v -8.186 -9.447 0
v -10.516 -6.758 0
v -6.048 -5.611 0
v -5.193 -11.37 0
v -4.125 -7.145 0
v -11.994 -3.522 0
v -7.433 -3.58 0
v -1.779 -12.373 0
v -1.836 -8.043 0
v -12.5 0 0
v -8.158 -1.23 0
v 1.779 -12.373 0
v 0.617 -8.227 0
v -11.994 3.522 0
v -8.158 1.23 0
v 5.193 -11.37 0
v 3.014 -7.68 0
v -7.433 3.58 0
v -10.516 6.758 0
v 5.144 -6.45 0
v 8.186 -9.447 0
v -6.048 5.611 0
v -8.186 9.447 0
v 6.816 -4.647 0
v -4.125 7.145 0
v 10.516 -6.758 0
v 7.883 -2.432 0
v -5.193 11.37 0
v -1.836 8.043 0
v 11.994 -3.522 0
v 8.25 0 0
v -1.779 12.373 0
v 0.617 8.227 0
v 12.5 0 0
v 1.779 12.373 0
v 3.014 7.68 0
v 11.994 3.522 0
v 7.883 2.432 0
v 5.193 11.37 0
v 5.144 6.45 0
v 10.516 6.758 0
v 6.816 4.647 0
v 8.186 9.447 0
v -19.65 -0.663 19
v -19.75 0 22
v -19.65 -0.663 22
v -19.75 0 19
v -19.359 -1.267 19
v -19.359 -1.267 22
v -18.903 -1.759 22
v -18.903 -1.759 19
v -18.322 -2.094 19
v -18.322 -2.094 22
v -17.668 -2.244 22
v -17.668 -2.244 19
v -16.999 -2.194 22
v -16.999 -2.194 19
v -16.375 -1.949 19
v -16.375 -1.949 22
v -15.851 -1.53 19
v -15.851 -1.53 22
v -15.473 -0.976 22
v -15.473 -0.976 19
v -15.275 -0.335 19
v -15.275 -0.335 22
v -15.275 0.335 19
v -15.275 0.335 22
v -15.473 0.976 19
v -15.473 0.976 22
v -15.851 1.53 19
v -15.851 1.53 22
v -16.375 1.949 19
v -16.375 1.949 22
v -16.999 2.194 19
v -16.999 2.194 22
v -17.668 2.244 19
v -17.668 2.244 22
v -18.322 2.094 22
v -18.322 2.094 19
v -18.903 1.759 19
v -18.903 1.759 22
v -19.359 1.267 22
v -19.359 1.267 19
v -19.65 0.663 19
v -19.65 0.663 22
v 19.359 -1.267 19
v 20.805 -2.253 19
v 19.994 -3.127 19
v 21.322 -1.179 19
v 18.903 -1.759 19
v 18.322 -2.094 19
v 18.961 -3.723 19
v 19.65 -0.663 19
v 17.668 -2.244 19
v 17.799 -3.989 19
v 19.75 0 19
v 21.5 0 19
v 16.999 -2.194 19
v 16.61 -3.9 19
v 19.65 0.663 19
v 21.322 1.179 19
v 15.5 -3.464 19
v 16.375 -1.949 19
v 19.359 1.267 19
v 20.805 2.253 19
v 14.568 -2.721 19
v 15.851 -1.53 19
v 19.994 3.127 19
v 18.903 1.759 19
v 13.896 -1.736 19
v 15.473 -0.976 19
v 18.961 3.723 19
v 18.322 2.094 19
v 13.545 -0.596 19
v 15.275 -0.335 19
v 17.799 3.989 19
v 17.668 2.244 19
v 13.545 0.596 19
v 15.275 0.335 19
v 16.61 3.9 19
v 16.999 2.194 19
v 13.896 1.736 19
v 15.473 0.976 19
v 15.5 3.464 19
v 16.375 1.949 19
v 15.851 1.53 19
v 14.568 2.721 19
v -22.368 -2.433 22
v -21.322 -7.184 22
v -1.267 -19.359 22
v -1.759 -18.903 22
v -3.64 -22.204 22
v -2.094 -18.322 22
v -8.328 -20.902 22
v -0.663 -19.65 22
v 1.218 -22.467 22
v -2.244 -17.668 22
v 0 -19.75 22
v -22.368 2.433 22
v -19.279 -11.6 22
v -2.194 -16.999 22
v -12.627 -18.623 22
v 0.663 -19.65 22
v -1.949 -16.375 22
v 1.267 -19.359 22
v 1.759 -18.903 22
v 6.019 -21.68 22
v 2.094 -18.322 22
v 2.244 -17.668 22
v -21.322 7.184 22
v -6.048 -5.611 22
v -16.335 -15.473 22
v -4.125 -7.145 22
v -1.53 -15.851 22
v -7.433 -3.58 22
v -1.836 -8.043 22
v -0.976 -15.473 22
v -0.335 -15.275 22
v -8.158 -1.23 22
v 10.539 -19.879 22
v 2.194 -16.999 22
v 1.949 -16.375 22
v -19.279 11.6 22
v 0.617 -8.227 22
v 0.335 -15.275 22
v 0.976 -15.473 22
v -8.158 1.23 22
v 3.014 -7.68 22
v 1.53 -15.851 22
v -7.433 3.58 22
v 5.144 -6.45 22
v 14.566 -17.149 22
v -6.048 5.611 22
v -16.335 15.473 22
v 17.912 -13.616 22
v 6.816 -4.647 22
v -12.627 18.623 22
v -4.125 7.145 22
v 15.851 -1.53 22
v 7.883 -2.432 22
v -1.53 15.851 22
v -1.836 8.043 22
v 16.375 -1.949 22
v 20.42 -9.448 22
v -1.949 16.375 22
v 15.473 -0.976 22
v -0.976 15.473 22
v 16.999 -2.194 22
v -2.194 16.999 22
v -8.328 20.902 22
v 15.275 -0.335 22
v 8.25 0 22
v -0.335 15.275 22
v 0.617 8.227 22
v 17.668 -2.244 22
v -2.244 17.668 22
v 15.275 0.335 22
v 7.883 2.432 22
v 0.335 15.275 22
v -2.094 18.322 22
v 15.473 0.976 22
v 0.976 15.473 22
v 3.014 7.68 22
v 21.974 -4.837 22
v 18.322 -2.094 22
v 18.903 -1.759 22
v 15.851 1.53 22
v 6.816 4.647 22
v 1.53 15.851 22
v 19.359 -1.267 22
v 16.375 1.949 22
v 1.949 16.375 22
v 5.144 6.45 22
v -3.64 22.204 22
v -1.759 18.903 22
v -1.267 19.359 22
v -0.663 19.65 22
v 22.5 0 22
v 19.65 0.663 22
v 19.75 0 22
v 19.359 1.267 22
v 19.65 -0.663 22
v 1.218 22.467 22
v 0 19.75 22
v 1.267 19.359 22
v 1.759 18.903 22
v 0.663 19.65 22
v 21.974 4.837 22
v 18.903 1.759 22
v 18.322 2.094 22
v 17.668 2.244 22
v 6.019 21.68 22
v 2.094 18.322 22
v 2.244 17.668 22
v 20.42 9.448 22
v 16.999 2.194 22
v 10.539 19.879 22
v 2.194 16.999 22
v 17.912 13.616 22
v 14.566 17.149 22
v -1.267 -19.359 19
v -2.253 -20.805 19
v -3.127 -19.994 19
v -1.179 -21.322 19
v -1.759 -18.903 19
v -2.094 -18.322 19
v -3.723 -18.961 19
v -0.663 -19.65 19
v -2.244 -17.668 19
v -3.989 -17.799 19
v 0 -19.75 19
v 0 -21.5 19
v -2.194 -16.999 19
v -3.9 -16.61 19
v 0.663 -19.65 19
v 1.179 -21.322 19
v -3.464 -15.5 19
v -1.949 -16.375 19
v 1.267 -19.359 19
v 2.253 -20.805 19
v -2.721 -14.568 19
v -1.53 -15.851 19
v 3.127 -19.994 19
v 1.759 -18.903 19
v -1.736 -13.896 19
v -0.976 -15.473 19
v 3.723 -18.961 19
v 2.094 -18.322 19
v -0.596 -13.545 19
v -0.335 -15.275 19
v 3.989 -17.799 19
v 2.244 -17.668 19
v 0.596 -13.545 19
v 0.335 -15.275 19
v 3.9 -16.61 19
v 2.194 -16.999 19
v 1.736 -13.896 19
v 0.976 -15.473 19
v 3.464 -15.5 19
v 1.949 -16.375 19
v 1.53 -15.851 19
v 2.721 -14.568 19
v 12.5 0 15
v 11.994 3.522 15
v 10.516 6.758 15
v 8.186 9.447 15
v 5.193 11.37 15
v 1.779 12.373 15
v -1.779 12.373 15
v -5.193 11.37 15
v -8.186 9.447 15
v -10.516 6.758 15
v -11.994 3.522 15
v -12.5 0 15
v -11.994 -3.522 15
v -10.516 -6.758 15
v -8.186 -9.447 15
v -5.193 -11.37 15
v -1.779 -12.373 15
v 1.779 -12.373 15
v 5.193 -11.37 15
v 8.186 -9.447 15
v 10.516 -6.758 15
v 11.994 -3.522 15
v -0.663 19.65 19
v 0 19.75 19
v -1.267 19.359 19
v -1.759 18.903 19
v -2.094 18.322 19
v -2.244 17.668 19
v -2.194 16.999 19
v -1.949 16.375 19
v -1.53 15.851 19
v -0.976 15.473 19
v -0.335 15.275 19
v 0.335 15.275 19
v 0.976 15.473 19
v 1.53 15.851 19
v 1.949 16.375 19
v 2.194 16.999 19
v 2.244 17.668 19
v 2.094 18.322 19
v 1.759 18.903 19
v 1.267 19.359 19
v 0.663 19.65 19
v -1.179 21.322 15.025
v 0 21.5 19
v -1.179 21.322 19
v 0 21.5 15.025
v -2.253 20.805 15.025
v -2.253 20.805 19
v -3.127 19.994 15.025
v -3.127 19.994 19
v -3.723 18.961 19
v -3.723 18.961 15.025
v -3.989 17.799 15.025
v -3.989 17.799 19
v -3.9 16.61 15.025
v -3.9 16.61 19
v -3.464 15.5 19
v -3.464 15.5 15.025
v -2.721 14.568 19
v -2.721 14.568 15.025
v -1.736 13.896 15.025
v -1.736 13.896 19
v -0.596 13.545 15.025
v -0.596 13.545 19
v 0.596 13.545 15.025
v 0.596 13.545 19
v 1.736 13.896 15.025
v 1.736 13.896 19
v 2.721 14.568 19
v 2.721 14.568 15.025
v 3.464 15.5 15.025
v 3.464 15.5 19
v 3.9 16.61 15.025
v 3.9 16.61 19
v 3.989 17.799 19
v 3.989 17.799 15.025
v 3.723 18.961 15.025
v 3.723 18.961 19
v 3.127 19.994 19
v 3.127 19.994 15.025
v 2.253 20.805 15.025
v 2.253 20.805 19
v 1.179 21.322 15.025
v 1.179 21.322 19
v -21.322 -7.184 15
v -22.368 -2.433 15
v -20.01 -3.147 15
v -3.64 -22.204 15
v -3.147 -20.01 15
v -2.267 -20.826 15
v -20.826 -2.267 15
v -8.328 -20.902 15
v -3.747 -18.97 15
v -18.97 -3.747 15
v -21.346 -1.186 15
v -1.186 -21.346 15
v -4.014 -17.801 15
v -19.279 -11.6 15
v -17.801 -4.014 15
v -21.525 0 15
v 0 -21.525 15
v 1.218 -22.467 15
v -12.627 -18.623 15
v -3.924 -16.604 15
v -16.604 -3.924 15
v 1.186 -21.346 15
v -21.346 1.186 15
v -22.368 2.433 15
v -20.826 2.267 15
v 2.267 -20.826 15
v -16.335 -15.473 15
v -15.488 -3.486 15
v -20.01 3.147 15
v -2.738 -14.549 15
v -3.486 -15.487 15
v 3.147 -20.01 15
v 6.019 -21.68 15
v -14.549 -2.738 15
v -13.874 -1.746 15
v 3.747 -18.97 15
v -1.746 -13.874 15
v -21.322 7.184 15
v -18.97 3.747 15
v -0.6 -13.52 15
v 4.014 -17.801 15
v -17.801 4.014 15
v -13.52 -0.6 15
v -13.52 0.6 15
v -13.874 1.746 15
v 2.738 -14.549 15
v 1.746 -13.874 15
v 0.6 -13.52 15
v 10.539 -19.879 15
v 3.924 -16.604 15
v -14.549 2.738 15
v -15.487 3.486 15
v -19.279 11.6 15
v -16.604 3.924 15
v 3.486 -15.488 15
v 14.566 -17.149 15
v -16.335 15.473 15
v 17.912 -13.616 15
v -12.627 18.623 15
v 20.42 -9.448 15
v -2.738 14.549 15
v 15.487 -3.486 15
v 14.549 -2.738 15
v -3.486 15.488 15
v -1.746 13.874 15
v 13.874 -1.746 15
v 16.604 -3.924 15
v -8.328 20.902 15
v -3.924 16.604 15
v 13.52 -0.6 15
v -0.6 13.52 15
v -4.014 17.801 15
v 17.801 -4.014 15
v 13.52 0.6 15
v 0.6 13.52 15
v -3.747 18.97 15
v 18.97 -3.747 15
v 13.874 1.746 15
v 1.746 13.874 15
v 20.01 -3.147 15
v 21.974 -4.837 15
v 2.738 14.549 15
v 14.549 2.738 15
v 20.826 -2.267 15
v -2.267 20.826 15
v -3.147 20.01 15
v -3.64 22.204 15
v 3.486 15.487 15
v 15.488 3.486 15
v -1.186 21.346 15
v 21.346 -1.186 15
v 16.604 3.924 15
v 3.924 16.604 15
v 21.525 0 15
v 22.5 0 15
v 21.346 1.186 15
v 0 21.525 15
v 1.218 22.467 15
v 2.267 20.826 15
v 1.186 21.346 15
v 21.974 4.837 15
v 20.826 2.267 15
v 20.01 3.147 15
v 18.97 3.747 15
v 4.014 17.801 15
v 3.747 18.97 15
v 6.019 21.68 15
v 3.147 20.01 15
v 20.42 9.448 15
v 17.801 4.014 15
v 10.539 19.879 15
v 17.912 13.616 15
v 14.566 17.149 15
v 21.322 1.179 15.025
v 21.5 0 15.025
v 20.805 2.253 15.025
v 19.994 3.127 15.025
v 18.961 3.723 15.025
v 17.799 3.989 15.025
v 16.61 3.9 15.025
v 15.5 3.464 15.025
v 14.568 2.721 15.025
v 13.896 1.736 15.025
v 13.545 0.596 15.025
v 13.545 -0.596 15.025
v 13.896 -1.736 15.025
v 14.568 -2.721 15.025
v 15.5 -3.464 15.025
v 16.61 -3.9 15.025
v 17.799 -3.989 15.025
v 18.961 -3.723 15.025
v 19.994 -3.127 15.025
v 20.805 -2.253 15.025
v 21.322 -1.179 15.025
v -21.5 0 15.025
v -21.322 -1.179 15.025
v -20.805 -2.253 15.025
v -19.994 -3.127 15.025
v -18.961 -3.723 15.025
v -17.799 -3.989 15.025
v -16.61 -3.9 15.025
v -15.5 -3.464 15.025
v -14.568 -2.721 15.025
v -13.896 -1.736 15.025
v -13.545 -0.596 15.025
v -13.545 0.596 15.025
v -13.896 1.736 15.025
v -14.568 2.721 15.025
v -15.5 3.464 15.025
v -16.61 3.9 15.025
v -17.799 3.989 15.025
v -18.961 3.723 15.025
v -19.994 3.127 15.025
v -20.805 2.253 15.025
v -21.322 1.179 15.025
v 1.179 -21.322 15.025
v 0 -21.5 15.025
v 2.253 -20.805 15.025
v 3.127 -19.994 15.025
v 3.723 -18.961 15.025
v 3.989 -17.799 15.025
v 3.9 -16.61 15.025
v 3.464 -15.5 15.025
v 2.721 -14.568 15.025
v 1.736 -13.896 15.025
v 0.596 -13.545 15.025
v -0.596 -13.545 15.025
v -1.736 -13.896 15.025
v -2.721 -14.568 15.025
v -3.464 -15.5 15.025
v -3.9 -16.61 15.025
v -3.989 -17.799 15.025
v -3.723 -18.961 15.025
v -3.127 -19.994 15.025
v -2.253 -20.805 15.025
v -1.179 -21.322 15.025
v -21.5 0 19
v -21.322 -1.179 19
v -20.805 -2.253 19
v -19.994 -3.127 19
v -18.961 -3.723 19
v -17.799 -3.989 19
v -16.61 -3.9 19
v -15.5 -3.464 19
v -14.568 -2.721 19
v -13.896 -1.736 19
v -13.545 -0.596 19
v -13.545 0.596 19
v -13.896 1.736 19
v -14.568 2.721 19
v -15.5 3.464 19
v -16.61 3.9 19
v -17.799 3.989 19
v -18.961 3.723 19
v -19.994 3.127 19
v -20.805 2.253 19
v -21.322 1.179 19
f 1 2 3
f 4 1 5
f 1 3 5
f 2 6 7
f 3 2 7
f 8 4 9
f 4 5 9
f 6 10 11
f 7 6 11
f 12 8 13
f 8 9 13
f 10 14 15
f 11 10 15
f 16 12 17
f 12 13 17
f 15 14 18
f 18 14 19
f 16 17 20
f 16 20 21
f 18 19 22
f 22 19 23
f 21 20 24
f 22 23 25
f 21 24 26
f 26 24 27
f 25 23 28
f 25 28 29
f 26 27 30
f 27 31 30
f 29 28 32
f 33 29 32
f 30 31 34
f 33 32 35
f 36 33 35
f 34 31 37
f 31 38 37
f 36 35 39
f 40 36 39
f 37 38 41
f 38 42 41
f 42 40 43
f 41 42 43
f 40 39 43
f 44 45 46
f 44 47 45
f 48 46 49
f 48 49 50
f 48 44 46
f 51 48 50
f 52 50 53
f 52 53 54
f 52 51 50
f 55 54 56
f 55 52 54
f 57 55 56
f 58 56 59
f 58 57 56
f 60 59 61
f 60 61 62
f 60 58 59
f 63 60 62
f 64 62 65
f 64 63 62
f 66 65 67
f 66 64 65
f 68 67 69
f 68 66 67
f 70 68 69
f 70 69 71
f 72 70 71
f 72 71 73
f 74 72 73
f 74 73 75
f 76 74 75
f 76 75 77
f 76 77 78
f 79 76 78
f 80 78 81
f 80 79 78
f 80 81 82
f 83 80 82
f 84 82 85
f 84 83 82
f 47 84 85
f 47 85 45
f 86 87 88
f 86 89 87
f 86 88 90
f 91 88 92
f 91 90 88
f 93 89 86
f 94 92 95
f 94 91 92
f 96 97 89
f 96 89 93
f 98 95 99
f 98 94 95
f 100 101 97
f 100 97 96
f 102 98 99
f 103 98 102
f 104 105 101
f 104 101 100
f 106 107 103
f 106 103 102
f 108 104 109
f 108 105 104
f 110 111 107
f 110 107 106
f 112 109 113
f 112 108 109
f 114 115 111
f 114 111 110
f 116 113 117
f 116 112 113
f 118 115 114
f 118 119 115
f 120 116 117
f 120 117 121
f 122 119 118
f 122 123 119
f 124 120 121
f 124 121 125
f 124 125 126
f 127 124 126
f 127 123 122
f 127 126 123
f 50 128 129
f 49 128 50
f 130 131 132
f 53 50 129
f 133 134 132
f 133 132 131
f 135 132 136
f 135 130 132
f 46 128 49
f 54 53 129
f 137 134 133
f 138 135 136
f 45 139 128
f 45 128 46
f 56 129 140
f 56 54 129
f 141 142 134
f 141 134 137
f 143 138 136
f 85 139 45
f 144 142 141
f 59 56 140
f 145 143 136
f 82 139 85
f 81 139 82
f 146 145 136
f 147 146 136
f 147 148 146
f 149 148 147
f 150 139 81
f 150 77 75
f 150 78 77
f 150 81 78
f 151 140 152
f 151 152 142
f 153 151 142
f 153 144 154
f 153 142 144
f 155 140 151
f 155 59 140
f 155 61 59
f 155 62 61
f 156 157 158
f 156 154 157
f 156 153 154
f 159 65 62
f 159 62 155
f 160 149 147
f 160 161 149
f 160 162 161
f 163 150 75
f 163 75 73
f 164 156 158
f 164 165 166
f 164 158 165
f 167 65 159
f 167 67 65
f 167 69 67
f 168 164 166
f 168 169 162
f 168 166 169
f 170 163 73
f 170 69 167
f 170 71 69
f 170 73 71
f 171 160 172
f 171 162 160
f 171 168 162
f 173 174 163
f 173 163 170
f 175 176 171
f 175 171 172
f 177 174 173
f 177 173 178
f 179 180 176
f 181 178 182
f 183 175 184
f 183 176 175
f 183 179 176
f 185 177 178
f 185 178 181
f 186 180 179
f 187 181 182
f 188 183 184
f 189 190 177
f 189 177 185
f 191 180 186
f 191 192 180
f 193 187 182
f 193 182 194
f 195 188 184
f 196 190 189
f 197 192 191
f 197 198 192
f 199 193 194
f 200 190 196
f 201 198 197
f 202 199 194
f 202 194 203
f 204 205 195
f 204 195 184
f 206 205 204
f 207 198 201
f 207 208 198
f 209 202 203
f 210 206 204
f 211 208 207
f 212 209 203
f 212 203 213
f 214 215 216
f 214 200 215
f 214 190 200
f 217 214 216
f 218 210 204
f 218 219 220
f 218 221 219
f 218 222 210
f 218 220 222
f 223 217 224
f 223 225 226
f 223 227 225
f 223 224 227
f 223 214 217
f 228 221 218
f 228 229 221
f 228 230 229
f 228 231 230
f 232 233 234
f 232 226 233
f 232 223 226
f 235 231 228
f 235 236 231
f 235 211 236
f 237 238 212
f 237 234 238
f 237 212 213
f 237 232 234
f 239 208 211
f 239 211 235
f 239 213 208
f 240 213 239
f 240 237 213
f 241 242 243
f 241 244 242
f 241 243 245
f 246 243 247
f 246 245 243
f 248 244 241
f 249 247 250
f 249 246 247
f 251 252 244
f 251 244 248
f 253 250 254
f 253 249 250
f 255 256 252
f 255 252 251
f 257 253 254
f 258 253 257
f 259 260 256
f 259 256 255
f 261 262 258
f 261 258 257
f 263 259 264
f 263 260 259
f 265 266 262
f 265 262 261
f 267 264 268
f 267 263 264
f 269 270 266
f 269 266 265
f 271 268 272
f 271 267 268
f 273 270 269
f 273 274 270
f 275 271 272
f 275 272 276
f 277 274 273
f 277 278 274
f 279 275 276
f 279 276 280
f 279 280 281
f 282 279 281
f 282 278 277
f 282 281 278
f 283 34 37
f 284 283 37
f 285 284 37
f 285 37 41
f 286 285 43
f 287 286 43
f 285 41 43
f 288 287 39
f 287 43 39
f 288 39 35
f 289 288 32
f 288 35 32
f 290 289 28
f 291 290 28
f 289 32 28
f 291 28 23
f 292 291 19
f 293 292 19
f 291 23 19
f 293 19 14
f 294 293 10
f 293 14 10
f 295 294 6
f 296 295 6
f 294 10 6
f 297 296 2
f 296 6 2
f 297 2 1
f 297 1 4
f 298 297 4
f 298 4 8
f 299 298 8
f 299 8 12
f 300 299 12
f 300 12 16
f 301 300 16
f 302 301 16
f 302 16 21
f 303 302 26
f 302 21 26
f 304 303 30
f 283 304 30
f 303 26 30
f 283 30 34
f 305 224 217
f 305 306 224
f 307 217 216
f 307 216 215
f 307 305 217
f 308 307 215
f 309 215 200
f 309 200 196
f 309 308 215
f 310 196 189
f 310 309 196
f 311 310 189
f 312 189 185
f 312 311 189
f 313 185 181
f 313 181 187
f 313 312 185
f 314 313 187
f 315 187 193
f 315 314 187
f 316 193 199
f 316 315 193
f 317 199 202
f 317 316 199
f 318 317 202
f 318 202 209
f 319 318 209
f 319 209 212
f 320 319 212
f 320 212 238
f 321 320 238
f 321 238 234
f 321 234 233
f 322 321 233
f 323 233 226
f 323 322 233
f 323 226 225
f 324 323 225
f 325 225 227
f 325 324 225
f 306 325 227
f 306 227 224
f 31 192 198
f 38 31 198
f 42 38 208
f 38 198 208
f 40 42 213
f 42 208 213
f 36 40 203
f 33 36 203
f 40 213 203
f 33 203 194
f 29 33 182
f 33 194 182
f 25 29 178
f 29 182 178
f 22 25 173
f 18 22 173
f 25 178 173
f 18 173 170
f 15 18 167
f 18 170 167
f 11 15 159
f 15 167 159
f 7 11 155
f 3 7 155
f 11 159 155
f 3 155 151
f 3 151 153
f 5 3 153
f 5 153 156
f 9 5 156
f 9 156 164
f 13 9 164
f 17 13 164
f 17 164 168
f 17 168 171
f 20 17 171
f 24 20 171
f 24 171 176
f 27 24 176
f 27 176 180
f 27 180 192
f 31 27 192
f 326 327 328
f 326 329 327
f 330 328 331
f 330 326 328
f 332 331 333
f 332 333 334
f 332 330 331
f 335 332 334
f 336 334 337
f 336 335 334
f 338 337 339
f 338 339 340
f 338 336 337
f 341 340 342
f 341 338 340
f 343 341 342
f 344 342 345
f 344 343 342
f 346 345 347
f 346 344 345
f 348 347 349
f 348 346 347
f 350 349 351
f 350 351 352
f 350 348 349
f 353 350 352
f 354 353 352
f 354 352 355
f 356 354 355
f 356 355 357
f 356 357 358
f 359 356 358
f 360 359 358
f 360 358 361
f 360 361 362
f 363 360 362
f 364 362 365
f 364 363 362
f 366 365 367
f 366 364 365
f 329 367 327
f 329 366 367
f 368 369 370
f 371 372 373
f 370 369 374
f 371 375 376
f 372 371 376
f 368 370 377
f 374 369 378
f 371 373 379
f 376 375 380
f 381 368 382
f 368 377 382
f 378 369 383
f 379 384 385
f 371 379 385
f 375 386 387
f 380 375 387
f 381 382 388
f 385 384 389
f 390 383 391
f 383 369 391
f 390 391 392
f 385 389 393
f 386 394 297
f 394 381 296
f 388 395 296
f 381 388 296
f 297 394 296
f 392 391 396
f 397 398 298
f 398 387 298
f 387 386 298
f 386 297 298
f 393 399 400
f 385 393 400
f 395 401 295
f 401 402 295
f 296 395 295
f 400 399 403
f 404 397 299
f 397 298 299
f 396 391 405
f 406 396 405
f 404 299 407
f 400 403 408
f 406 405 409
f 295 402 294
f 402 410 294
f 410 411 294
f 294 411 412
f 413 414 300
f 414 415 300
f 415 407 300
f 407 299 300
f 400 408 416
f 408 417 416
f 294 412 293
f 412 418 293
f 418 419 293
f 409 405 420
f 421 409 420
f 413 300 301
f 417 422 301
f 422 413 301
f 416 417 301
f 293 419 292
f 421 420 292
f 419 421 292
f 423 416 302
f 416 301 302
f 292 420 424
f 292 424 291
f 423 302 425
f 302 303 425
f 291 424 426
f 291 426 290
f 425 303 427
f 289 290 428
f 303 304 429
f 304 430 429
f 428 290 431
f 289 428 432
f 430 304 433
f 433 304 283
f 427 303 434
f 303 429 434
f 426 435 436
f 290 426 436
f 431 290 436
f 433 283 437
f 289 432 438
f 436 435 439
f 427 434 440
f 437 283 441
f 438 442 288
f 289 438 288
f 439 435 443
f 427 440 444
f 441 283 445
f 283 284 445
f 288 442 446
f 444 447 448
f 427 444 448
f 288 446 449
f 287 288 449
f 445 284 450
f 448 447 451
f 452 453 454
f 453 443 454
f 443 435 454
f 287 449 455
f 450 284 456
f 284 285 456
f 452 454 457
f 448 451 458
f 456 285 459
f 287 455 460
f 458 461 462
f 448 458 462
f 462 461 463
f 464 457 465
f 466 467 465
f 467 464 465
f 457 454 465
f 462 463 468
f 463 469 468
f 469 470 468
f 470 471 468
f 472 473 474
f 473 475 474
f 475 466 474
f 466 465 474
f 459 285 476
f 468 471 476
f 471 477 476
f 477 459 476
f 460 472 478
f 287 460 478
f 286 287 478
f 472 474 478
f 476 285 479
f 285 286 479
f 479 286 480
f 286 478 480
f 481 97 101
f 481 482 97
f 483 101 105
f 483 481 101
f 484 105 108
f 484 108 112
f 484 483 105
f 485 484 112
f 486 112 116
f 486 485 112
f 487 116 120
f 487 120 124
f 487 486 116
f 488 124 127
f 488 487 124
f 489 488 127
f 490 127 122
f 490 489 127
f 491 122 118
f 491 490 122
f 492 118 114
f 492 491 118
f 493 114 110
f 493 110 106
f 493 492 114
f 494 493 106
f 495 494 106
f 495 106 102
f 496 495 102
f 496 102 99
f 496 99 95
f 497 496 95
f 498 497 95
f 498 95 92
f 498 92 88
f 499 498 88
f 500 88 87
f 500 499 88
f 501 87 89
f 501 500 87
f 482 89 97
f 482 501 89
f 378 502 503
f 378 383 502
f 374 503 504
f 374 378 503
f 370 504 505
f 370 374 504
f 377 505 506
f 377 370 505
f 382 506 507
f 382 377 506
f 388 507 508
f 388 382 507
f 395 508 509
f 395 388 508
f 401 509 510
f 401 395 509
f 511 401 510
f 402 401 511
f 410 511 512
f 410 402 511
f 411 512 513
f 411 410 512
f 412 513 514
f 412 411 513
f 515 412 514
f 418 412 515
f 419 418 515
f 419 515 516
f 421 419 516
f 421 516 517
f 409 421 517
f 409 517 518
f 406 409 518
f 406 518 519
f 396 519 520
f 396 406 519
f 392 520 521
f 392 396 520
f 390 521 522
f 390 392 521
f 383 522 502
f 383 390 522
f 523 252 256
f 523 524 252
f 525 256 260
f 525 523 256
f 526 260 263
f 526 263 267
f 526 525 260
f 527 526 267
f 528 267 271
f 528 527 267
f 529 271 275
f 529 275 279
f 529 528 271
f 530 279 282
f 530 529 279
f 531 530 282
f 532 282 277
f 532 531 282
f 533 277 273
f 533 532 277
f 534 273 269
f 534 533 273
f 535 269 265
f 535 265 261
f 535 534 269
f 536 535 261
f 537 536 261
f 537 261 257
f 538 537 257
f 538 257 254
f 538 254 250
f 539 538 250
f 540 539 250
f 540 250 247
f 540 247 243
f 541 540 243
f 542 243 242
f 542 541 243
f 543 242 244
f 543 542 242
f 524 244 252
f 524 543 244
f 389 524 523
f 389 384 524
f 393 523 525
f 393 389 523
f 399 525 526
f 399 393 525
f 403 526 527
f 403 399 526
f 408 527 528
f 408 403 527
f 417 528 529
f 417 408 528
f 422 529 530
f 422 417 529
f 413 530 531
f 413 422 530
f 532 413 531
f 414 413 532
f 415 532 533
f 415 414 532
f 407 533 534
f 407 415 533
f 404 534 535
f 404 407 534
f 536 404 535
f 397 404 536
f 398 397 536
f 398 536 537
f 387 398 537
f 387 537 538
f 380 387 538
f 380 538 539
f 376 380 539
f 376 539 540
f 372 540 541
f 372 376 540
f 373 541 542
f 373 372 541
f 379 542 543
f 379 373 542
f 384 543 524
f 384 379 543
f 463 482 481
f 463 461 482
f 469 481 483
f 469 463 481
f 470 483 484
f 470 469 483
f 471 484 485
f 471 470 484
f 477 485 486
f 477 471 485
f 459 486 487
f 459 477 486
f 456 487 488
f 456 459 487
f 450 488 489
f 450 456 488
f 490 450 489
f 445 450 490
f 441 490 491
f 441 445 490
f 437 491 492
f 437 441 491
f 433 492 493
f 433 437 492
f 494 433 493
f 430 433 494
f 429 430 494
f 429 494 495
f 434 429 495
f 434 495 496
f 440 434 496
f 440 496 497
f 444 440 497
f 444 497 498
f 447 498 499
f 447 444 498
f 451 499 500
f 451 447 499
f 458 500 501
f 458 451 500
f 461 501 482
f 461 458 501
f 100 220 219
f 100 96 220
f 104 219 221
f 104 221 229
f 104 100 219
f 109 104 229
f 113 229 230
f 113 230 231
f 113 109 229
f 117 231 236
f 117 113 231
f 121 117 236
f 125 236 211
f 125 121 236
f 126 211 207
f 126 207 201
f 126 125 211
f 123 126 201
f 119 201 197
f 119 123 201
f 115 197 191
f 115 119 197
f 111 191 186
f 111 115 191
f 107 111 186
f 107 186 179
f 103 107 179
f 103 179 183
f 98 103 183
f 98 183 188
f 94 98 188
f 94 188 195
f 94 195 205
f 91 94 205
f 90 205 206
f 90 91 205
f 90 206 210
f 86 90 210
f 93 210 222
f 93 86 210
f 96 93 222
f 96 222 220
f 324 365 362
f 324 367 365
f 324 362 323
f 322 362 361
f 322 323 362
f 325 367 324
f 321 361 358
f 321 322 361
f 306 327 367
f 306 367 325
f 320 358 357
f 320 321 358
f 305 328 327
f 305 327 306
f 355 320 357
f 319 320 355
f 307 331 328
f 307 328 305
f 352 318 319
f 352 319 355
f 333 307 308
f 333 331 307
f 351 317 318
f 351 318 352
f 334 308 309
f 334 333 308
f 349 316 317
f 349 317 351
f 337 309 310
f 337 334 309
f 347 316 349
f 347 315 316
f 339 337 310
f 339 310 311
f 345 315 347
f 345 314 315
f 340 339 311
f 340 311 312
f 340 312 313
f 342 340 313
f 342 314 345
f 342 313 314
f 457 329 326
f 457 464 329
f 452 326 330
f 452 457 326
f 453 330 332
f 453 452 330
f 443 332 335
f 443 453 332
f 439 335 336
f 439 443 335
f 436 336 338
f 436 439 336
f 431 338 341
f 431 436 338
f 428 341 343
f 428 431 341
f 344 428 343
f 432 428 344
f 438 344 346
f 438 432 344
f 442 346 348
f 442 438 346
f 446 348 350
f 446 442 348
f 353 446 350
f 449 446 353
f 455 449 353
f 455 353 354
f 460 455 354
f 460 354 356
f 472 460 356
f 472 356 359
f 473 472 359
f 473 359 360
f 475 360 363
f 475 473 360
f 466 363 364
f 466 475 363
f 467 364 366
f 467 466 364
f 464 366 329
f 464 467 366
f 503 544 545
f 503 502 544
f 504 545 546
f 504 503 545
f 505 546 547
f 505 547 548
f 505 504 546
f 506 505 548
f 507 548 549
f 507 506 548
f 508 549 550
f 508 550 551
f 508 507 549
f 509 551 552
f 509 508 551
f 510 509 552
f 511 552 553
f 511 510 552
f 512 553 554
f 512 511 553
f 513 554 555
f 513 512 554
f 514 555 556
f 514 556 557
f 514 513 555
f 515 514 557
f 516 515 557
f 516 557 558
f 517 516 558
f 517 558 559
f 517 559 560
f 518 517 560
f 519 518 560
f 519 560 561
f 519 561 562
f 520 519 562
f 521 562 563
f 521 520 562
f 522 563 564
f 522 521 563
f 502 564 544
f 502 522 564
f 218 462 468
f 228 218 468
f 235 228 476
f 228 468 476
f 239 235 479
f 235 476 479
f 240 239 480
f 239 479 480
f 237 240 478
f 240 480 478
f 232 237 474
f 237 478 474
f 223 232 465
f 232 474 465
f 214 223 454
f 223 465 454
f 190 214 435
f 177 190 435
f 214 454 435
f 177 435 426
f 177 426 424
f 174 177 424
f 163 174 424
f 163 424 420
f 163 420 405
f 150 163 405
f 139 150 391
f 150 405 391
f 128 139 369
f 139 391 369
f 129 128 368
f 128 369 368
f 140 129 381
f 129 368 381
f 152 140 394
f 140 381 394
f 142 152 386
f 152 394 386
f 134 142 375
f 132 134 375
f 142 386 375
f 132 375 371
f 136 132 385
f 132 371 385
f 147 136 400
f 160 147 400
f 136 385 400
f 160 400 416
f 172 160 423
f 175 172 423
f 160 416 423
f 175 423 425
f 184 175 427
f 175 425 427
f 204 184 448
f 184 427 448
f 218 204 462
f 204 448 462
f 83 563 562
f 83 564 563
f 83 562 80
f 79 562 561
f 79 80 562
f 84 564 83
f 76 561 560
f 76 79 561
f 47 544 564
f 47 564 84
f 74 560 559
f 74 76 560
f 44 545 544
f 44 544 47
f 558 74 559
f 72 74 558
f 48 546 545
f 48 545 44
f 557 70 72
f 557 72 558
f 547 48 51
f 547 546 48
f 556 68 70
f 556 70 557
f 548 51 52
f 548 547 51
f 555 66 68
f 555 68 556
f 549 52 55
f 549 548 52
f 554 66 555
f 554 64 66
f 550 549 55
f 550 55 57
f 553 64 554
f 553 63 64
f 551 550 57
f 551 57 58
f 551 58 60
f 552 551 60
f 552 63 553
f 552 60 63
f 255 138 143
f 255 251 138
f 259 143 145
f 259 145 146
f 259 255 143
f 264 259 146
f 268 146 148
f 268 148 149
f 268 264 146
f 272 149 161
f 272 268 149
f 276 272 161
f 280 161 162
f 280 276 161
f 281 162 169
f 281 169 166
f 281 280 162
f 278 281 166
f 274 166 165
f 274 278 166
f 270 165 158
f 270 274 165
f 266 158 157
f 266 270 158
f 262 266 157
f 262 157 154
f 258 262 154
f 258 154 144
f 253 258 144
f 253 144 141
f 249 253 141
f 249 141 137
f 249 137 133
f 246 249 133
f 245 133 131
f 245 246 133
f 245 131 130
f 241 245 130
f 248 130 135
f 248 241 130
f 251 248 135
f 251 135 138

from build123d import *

# Parameters (mm, degrees)
SKETCH_1_R               = 12.5
EXTRUDE_1_DEPTH          = 15
SKETCH_2_R               = 22.5
EXTRUDE_2_DEPTH          = 7
M18X1_5_1_D              = 16.5
M18X1_5_1_DEPTH          = 43.5
M18X1_5_1_TIP            = 4.957100107
PATTERN_CIRCULAR_1_COUNT = 4


with BuildPart() as part:
    # 草图1 → 拉伸1 (new body)
    with BuildSketch(Plane.XY):
        Circle(SKETCH_1_R)
    extrude(amount=EXTRUDE_1_DEPTH)

    # 草图2 → 拉伸2 (add)
    with BuildSketch(Plane.XY.offset(15)):
        Circle(SKETCH_2_R)
    extrude(amount=EXTRUDE_2_DEPTH)

    # M18x1.5 螺纹孔1
    with Locations(Plane(origin=(0, 0, 0), x_dir=(-1, 0, 0), z_dir=(0, 0, -1))):
        with Locations((0, 0)):
            Hole(M18X1_5_1_D / 2, depth=M18X1_5_1_DEPTH)
            with Locations((0, 0, -(M18X1_5_1_DEPTH + M18X1_5_1_TIP / 2))):  # 118° drill point
                Cone(0, M18X1_5_1_D / 2, M18X1_5_1_TIP, mode=Mode.SUBTRACT)

    # 草图5 → M4 六角凹头螺钉的柱形沉头孔1 (revolve, cut)
    with BuildSketch(Plane(origin=(0, 17.5, 15), x_dir=(0, 1, 0), z_dir=(1, 0, 0))):
        Polygon((0, 0), (0, 7), (2.25, 7), (2.25, 4), (4, 4), (4, 0.025), (4.025, 0), align=None)
    hole_wizard_m4_1 = revolve(axis=Axis((0, 17.5, 8.65), (0, 0, 1)), mode=Mode.SUBTRACT)

    # 阵列(圆周)1: M4 六角凹头螺钉的柱形沉头孔1 ×4 about axis
    pattern_circular_1_axis = Axis((0, 0, 0), (0, 0, 1))
    for i in range(1, PATTERN_CIRCULAR_1_COUNT):
        add(hole_wizard_m4_1.rotate(pattern_circular_1_axis, i * 360 / PATTERN_CIRCULAR_1_COUNT), mode=Mode.SUBTRACT)


solid = part.part
